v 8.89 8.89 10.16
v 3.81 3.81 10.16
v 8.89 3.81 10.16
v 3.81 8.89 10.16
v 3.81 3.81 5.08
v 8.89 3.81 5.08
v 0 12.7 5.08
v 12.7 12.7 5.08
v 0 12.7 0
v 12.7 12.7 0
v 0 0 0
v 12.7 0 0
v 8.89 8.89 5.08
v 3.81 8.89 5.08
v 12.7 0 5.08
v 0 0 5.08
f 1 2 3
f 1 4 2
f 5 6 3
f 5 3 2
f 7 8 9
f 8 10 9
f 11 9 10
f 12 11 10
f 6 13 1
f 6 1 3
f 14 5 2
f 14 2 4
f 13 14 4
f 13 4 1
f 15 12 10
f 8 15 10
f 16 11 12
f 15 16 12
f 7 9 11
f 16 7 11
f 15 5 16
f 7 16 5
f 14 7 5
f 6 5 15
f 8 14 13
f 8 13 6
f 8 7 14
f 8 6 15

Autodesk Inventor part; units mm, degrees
ref_plane "YZ Plane" through (0, 0, 0) normal (1, 0, 0) x (0, 1, 0)
ref_plane "XZ Plane" through (0, 0, 0) normal (0, 1, 0) x (-1, 0, 0)
ref_plane "XY Plane" through (0, 0, 0) normal (0, 0, 1) x (1, 0, 0)
sketch "Sketch1" plane through (0, 0, 0) normal (0, 0, 1) x (1, 0, 0)
  line L0 (0, 0) -> (12.7, 0)
  line L1 (12.7, 0) -> (12.7, 12.7)
  line L2 (12.7, 12.7) -> (0, 12.7)
  line L3 (0, 12.7) -> (0, 0)
  dimension "d0" = 12.7
  dimension "d1" = 12.7
extrude "Extrusion1" add sketch "Sketch1" along normal blind 5.08
sketch "Sketch3" plane through (0, 0, 5.08) normal (0, 0, 1) x (1, 0, 0)
  line L0 (3.81, 8.89) -> (8.89, 8.89)
  line L1 (8.89, 8.89) -> (8.89, 3.81)
  line L2 (8.89, 3.81) -> (3.81, 3.81)
  line L3 (3.81, 3.81) -> (3.81, 8.89)
  line L4 (0, 12.7) -> (0, 0) projected
  line L5 (12.7, 0) -> (12.7, 12.7) projected
  line L6 (12.7, 12.7) -> (0, 12.7) projected
  line L7 (0, 0) -> (12.7, 0) projected
  point P0 (12.7, 6.35)
  dimension "d10" = 3.81
  dimension "d11" = 3.81
  dimension "d12" = 3.81
  dimension "d13" = 3.81
extrude "Extrusion3" add sketch "Sketch3" along normal blind 5.08 contours L0 L1 L2 L3
properties part number "Handle"
